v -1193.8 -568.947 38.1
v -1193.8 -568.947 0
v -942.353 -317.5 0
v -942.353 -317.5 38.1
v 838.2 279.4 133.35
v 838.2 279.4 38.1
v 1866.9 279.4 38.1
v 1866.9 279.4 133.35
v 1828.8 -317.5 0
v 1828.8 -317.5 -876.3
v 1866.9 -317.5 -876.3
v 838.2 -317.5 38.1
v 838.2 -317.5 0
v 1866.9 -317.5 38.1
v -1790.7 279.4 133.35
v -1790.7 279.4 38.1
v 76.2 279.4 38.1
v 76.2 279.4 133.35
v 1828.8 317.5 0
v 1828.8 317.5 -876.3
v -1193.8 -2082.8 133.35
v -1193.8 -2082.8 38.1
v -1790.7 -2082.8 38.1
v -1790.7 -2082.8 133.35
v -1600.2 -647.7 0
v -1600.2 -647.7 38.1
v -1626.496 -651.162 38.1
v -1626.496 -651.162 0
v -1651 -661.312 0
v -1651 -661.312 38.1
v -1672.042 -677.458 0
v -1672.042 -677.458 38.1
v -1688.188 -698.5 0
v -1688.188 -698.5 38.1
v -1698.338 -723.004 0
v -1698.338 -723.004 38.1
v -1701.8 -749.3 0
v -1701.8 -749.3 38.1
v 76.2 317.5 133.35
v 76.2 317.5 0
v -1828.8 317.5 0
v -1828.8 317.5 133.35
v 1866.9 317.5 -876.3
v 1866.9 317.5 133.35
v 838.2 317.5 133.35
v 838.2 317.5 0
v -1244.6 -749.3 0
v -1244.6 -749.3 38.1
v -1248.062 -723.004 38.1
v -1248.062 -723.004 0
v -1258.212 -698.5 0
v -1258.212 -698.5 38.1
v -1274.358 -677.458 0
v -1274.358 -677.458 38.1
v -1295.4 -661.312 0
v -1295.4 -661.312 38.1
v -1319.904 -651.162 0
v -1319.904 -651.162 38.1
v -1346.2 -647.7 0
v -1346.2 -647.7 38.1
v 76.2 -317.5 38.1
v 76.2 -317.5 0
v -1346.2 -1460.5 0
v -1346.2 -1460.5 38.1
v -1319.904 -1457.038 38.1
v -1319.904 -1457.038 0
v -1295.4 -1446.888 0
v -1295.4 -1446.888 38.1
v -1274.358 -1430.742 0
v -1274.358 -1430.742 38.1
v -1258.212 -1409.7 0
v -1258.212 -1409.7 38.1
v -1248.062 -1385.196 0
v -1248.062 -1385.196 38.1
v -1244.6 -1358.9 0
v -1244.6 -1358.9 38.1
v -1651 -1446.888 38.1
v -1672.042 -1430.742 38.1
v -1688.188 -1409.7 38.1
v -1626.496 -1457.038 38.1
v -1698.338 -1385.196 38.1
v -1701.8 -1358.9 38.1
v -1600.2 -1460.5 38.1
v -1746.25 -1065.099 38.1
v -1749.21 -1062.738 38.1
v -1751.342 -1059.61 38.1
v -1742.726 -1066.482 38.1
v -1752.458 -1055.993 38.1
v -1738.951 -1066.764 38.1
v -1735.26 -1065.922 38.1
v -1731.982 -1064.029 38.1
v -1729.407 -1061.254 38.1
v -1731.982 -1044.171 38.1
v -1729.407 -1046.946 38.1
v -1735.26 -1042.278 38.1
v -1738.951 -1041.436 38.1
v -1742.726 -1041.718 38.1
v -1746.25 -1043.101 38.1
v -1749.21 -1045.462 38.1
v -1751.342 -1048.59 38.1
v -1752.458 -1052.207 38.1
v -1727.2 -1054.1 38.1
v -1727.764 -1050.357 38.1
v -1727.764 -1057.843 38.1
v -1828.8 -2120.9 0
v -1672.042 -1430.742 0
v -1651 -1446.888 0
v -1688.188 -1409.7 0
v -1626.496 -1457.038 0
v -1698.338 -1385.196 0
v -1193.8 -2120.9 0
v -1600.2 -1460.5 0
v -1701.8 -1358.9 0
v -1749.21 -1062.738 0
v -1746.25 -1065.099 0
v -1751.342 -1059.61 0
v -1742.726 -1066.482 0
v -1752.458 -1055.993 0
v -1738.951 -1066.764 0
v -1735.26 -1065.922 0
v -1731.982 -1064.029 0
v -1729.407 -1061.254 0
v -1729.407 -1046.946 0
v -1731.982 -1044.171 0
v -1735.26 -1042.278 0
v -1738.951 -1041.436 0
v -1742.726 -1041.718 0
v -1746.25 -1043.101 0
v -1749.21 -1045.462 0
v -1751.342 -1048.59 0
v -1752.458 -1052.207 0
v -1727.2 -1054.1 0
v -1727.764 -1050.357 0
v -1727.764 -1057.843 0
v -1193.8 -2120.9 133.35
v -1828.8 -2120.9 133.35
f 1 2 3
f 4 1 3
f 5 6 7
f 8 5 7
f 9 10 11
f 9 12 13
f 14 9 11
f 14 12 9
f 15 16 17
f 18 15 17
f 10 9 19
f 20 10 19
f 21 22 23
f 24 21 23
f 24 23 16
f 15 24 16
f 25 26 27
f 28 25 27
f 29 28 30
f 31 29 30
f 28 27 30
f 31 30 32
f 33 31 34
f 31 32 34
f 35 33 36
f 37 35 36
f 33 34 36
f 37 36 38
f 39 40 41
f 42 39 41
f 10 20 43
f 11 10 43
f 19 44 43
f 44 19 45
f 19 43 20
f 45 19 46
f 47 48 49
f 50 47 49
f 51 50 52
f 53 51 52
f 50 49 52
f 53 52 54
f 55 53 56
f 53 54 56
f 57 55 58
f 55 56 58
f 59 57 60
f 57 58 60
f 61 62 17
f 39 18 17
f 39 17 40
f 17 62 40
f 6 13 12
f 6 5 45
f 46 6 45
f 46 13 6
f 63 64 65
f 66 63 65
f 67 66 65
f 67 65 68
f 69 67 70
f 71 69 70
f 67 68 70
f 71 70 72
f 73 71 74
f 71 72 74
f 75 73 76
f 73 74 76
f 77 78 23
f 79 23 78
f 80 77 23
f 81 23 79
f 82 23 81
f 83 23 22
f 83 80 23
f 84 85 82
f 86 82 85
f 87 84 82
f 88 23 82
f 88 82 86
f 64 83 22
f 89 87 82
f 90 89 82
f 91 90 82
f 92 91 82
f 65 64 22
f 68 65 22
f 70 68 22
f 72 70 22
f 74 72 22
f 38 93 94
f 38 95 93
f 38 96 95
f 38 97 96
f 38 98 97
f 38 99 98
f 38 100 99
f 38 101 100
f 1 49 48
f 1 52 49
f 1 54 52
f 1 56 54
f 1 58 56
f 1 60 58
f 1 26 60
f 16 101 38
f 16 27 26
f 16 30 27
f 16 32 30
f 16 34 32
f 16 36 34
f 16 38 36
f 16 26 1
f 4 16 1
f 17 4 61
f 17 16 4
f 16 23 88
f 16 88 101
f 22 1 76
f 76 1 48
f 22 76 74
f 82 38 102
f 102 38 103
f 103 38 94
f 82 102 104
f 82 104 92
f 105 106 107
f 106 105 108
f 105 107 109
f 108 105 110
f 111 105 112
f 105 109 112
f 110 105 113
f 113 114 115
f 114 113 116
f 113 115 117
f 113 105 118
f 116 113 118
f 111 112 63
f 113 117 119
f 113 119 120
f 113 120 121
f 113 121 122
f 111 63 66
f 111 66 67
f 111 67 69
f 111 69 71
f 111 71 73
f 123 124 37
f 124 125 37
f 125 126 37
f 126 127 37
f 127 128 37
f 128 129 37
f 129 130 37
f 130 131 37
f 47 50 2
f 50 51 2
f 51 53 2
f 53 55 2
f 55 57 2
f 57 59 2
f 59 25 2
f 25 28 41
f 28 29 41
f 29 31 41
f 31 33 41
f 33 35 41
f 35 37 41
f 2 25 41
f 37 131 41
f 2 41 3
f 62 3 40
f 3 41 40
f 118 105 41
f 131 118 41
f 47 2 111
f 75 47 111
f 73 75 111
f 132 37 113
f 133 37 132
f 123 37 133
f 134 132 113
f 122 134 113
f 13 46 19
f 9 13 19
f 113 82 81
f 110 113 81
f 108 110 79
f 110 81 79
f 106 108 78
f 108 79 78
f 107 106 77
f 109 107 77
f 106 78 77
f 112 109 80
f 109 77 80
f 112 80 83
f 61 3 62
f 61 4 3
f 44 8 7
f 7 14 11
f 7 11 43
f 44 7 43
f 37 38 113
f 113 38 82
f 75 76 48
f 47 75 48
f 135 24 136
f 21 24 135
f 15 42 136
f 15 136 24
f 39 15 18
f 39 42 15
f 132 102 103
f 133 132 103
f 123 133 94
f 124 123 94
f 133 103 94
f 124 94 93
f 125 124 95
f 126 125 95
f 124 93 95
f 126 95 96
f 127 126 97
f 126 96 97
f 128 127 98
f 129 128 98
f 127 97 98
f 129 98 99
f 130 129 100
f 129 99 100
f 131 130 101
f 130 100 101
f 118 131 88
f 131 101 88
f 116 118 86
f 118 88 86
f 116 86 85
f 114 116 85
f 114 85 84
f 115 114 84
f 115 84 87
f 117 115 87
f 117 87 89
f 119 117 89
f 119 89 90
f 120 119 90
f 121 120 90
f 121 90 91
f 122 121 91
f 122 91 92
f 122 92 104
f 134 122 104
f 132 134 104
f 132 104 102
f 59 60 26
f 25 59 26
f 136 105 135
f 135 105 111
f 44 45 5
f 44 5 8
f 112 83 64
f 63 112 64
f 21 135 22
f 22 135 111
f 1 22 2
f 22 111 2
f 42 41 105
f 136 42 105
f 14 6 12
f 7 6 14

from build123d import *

# Parameters (mm, degrees)
F0_W          = 38.1
F0_H          = 635
F1_DEPTH      = 38.1
F2_DEPTH      = 876.3
F4_DEPTH      = 95.25
F5_W          = 762
F5_H          = 807.1839261055
F6_DEPTH      = 203.2
F6_DEPTH_BACK = 203.2
F7_R          = 12.7
F8_DEPTH      = 127


with BuildPart() as f1:
    # F0 (on Top) → F1 (new body)
    with BuildSketch(Plane.XY):
        Polygon((1828.8, -317.5), (1828.8, 317.5), (-1828.8, 317.5), (-1828.8, -317.5), (-1193.8, -317.5), (-942.3528286101, -317.5), align=None)
        Polygon((-1193.8, -317.5), (-1828.8, -317.5), (-1828.8, -2120.9), (-1193.8, -2120.9), (-1193.8, -568.9471713899), align=None)
        with Locations((1847.85, 0)):
            Rectangle(F0_W, F0_H)
        Polygon((-1193.8, -568.9471713899), (-942.3528286101, -317.5), (-1193.8, -317.5), align=None)
    extrude(amount=F1_DEPTH)

    # F0 (on Top) → F2 (join)
    with BuildSketch(Plane.XY):
        with Locations((1847.85, 0)):
            Rectangle(F0_W, F0_H)
    extrude(amount=-F2_DEPTH)

    # F3 (on face) → F4 (join)
    with BuildSketch(Plane.XY.offset(38.1)):
        Polygon((-1828.8, 279.4), (-1828.8, -2120.9), (-1790.7, -2120.9), (-1193.8, -2120.9), (-1193.8, -2082.8), (-1790.7, -2082.8), (-1790.7, 279.4), (1866.9, 279.4), (1866.9, 317.5), (-1790.7, 317.5), (-1828.8, 317.5), align=None)
    extrude(amount=F4_DEPTH)

    # F5 (on face) → F6 (cut, two sides)
    with BuildSketch(Plane.XY.offset(38.1)) as f6_sk:
        with Locations((457.2, 86.0919630527)):
            Rectangle(F5_W, F5_H)
    extrude(amount=-F6_DEPTH, mode=Mode.SUBTRACT)
    extrude(f6_sk.sketch, amount=F6_DEPTH_BACK, mode=Mode.SUBTRACT)

    # F7 (on face) → F8 (cut)
    with BuildSketch(Plane.XY.offset(38.1)):
        with BuildLine():
            ThreePointArc((-1244.6, -749.3), (-1274.3579510314, -677.4579510314), (-1346.2, -647.7))
            Line((-1346.2, -647.7), (-1600.2, -647.7))
            ThreePointArc((-1600.2, -647.7), (-1672.0420489686, -677.4579510314), (-1701.8, -749.3))
            Line((-1701.8, -749.3), (-1701.8, -1358.9))
            ThreePointArc((-1701.8, -1358.9), (-1672.0420489686, -1430.7420489686), (-1600.2, -1460.5))
            Line((-1600.2, -1460.5), (-1346.2, -1460.5))
            ThreePointArc((-1346.2, -1460.5), (-1274.3579510314, -1430.7420489686), (-1244.6, -1358.9))
            Line((-1244.6, -1358.9), (-1244.6, -749.3))
        make_face()
        with Locations((-1739.9, -1054.1)):
            Circle(F7_R)
    extrude(amount=-F8_DEPTH, mode=Mode.SUBTRACT)


solid = f1.part
